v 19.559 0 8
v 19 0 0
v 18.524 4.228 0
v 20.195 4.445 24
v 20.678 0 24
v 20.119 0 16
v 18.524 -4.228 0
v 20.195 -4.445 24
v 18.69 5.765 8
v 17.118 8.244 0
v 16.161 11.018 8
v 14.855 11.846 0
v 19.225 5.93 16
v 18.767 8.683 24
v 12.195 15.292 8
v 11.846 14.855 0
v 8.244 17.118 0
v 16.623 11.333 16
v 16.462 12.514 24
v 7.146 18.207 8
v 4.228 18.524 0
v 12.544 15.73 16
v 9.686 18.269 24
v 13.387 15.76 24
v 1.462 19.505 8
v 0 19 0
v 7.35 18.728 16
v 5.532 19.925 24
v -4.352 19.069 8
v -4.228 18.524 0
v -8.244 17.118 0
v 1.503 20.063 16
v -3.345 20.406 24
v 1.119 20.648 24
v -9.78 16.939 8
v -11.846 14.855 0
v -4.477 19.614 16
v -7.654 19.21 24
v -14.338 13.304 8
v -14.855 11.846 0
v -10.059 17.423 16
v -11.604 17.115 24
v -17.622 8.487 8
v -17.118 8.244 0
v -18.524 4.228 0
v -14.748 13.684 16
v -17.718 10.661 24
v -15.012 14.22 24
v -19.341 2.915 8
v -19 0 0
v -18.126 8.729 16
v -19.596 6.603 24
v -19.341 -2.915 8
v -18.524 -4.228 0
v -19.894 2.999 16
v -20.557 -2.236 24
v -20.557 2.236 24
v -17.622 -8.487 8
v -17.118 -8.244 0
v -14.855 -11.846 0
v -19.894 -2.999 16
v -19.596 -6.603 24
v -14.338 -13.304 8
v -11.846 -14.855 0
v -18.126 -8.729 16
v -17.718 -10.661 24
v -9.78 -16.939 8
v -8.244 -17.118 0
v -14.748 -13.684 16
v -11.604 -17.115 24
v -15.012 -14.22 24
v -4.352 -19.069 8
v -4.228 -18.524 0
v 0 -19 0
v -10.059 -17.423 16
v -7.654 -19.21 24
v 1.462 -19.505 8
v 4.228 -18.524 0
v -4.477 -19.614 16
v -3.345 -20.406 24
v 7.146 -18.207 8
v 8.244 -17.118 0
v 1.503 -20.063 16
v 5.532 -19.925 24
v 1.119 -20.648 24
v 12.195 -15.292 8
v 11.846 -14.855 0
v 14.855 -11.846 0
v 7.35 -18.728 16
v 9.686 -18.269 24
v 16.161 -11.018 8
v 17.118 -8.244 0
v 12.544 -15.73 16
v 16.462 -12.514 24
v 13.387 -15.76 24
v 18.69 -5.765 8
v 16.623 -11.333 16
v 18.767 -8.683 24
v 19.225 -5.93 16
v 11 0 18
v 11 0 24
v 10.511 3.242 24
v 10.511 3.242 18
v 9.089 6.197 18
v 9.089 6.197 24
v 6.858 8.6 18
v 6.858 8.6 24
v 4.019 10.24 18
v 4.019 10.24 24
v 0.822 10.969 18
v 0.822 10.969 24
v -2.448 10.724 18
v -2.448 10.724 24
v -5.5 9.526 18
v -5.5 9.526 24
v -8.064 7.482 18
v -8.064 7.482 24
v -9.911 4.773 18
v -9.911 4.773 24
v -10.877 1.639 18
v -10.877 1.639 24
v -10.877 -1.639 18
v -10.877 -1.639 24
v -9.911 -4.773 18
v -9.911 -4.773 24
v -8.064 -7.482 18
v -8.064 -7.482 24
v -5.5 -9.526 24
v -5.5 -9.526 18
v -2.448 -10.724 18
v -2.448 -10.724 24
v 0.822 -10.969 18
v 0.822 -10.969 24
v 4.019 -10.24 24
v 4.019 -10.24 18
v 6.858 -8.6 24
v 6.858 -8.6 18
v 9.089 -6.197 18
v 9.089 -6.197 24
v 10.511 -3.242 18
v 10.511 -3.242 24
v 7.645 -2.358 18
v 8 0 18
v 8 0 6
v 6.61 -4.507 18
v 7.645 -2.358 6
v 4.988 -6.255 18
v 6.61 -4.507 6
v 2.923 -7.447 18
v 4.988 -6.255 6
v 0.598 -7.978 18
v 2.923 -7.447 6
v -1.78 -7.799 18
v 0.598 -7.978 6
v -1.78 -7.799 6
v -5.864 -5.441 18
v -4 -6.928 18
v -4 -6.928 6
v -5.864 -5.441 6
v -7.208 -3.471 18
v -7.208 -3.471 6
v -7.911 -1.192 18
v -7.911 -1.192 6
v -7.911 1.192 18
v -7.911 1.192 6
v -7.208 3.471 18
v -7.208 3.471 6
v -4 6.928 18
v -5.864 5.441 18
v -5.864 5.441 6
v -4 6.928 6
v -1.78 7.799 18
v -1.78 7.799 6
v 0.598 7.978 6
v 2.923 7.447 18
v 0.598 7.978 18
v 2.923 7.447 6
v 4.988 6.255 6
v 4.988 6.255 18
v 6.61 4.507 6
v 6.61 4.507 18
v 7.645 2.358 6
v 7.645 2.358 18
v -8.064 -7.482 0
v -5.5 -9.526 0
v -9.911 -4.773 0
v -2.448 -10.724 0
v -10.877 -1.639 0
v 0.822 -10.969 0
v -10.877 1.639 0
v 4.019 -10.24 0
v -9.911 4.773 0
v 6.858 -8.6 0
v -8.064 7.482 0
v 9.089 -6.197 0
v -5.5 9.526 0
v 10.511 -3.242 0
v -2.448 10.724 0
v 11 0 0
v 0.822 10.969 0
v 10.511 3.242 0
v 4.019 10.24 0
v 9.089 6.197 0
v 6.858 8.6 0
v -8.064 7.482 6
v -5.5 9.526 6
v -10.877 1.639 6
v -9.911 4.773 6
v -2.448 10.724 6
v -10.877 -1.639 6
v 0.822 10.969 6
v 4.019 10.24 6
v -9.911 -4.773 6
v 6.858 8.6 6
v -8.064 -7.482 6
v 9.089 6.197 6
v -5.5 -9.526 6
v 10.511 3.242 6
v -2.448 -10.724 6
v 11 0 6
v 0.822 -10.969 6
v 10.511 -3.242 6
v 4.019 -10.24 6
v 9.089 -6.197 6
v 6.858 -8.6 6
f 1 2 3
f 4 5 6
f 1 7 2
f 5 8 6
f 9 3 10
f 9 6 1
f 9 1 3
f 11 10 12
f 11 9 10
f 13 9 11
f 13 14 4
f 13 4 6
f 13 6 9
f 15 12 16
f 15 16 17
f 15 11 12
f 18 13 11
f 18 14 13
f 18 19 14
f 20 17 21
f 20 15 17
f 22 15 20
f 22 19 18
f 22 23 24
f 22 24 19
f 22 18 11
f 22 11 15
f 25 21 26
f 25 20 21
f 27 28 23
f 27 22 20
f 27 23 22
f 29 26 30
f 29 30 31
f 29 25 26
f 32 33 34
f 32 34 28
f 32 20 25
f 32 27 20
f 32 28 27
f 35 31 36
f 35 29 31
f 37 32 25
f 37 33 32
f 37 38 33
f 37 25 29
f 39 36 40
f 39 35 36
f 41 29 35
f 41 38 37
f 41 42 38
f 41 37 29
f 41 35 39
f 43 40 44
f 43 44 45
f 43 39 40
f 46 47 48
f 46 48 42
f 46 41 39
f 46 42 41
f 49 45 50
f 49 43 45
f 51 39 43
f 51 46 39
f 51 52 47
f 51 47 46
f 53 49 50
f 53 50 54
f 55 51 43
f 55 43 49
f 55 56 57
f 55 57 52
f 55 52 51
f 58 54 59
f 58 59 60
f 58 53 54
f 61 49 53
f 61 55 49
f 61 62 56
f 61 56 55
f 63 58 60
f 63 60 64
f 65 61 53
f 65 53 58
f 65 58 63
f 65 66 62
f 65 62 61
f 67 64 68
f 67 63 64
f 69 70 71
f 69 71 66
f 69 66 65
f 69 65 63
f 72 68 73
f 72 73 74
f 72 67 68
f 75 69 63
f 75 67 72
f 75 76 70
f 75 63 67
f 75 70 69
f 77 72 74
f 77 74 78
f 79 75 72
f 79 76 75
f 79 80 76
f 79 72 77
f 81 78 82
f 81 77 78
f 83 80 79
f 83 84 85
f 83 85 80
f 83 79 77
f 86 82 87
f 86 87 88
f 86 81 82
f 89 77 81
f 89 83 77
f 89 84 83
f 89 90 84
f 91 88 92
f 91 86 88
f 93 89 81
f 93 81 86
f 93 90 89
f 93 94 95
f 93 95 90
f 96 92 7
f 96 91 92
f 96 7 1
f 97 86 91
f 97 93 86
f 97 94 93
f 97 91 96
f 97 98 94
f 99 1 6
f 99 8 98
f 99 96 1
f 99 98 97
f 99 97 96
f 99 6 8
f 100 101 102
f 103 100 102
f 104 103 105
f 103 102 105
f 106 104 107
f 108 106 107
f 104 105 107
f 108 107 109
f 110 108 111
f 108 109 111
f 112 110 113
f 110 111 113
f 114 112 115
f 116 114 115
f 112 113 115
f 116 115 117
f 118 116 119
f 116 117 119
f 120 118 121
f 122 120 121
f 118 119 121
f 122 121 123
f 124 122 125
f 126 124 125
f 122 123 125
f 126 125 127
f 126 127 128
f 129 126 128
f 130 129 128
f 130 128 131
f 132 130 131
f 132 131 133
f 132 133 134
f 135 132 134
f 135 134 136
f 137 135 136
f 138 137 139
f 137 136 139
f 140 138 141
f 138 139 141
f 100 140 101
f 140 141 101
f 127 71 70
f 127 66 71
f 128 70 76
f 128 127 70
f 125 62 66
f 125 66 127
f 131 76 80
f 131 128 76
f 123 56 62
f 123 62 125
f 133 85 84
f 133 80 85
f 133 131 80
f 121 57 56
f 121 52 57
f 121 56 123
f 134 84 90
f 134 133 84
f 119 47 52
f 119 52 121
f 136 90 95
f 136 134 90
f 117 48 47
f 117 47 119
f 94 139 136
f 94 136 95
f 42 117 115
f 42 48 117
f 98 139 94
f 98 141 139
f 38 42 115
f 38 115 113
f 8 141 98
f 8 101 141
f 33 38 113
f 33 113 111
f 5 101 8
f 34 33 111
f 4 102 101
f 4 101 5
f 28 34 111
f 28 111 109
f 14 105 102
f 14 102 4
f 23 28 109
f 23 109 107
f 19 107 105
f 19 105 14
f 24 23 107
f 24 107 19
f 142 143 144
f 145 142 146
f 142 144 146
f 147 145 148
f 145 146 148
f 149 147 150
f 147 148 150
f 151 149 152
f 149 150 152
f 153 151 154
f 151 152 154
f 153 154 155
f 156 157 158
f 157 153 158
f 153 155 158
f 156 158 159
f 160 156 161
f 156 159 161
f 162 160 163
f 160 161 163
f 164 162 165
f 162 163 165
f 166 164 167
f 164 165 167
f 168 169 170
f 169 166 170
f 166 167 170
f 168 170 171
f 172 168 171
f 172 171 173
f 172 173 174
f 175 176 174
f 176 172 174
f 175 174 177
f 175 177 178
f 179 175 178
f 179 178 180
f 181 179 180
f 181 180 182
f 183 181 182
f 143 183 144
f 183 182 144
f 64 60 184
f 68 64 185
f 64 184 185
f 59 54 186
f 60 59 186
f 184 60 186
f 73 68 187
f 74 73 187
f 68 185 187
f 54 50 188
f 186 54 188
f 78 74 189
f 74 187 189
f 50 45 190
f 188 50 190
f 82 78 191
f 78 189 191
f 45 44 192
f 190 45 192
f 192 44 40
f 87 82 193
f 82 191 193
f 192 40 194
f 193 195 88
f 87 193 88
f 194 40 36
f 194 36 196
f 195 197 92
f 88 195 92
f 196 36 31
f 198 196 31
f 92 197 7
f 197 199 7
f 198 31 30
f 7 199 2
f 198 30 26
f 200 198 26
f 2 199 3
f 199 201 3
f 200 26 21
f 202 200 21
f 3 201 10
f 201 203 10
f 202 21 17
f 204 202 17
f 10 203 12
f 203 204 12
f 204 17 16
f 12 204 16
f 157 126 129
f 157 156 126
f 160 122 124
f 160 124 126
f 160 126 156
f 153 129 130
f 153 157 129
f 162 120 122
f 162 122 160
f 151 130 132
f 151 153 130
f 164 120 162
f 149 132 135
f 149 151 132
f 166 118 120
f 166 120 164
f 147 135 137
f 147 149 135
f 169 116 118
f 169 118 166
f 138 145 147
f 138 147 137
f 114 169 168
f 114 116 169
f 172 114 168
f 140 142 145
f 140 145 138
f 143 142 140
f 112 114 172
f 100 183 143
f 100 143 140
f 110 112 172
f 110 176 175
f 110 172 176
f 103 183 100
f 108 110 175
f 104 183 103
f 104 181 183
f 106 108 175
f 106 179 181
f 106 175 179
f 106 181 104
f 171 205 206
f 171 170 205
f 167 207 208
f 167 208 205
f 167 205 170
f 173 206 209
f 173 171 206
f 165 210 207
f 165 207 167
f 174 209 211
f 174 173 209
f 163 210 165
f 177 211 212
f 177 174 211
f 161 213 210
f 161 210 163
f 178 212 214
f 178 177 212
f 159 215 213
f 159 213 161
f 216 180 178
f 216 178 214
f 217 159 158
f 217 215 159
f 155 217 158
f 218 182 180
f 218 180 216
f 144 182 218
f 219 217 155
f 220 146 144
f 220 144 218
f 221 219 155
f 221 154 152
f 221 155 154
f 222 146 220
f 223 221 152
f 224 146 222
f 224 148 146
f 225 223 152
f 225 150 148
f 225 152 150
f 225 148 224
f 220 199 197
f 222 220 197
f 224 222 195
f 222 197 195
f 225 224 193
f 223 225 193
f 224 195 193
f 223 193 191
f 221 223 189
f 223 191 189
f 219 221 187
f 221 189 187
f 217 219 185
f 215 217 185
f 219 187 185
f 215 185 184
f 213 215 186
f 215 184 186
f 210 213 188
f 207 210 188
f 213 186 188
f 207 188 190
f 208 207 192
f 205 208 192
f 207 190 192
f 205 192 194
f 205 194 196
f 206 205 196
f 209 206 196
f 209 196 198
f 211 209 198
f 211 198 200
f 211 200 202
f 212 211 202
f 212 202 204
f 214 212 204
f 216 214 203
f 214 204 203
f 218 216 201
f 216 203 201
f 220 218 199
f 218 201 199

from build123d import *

# Parameters (mm, degrees)
F0_R     = 19
F1_DEPTH = 24
F1_TAPER = -4
F2_R     = 8
F3_DEPTH = 24.0010001
F2_R_2   = 11
F4_DEPTH = 6
F5_R     = 11
F5_R_2   = 8
F6_DEPTH = 6


with BuildPart() as f1:
    # F0 (on Top) → F1 (new body)
    with BuildSketch(Plane.XY):
        Circle(F0_R)
    extrude(amount=F1_DEPTH, taper=F1_TAPER)

    # F2 (on face) → F3 (cut, through all)
    with BuildSketch(Plane(origin=(0, 0, 0), x_dir=(1, 0, 0), z_dir=(0, 0, -1))):
        Circle(F2_R)
    extrude(amount=-F3_DEPTH, mode=Mode.SUBTRACT)

    # F2 (on face) → F4 (cut)
    with BuildSketch(Plane(origin=(0, 0, 0), x_dir=(1, 0, 0), z_dir=(0, 0, -1))):
        Circle(F2_R_2)
        Circle(F2_R, mode=Mode.SUBTRACT)
    extrude(amount=-F4_DEPTH, mode=Mode.SUBTRACT)

    # F5 (on face) → F6 (cut)
    with BuildSketch(Plane.XY.offset(24)):
        Circle(F5_R)
        Circle(F5_R_2, mode=Mode.SUBTRACT)
    extrude(amount=-F6_DEPTH, mode=Mode.SUBTRACT)


solid = f1.part
